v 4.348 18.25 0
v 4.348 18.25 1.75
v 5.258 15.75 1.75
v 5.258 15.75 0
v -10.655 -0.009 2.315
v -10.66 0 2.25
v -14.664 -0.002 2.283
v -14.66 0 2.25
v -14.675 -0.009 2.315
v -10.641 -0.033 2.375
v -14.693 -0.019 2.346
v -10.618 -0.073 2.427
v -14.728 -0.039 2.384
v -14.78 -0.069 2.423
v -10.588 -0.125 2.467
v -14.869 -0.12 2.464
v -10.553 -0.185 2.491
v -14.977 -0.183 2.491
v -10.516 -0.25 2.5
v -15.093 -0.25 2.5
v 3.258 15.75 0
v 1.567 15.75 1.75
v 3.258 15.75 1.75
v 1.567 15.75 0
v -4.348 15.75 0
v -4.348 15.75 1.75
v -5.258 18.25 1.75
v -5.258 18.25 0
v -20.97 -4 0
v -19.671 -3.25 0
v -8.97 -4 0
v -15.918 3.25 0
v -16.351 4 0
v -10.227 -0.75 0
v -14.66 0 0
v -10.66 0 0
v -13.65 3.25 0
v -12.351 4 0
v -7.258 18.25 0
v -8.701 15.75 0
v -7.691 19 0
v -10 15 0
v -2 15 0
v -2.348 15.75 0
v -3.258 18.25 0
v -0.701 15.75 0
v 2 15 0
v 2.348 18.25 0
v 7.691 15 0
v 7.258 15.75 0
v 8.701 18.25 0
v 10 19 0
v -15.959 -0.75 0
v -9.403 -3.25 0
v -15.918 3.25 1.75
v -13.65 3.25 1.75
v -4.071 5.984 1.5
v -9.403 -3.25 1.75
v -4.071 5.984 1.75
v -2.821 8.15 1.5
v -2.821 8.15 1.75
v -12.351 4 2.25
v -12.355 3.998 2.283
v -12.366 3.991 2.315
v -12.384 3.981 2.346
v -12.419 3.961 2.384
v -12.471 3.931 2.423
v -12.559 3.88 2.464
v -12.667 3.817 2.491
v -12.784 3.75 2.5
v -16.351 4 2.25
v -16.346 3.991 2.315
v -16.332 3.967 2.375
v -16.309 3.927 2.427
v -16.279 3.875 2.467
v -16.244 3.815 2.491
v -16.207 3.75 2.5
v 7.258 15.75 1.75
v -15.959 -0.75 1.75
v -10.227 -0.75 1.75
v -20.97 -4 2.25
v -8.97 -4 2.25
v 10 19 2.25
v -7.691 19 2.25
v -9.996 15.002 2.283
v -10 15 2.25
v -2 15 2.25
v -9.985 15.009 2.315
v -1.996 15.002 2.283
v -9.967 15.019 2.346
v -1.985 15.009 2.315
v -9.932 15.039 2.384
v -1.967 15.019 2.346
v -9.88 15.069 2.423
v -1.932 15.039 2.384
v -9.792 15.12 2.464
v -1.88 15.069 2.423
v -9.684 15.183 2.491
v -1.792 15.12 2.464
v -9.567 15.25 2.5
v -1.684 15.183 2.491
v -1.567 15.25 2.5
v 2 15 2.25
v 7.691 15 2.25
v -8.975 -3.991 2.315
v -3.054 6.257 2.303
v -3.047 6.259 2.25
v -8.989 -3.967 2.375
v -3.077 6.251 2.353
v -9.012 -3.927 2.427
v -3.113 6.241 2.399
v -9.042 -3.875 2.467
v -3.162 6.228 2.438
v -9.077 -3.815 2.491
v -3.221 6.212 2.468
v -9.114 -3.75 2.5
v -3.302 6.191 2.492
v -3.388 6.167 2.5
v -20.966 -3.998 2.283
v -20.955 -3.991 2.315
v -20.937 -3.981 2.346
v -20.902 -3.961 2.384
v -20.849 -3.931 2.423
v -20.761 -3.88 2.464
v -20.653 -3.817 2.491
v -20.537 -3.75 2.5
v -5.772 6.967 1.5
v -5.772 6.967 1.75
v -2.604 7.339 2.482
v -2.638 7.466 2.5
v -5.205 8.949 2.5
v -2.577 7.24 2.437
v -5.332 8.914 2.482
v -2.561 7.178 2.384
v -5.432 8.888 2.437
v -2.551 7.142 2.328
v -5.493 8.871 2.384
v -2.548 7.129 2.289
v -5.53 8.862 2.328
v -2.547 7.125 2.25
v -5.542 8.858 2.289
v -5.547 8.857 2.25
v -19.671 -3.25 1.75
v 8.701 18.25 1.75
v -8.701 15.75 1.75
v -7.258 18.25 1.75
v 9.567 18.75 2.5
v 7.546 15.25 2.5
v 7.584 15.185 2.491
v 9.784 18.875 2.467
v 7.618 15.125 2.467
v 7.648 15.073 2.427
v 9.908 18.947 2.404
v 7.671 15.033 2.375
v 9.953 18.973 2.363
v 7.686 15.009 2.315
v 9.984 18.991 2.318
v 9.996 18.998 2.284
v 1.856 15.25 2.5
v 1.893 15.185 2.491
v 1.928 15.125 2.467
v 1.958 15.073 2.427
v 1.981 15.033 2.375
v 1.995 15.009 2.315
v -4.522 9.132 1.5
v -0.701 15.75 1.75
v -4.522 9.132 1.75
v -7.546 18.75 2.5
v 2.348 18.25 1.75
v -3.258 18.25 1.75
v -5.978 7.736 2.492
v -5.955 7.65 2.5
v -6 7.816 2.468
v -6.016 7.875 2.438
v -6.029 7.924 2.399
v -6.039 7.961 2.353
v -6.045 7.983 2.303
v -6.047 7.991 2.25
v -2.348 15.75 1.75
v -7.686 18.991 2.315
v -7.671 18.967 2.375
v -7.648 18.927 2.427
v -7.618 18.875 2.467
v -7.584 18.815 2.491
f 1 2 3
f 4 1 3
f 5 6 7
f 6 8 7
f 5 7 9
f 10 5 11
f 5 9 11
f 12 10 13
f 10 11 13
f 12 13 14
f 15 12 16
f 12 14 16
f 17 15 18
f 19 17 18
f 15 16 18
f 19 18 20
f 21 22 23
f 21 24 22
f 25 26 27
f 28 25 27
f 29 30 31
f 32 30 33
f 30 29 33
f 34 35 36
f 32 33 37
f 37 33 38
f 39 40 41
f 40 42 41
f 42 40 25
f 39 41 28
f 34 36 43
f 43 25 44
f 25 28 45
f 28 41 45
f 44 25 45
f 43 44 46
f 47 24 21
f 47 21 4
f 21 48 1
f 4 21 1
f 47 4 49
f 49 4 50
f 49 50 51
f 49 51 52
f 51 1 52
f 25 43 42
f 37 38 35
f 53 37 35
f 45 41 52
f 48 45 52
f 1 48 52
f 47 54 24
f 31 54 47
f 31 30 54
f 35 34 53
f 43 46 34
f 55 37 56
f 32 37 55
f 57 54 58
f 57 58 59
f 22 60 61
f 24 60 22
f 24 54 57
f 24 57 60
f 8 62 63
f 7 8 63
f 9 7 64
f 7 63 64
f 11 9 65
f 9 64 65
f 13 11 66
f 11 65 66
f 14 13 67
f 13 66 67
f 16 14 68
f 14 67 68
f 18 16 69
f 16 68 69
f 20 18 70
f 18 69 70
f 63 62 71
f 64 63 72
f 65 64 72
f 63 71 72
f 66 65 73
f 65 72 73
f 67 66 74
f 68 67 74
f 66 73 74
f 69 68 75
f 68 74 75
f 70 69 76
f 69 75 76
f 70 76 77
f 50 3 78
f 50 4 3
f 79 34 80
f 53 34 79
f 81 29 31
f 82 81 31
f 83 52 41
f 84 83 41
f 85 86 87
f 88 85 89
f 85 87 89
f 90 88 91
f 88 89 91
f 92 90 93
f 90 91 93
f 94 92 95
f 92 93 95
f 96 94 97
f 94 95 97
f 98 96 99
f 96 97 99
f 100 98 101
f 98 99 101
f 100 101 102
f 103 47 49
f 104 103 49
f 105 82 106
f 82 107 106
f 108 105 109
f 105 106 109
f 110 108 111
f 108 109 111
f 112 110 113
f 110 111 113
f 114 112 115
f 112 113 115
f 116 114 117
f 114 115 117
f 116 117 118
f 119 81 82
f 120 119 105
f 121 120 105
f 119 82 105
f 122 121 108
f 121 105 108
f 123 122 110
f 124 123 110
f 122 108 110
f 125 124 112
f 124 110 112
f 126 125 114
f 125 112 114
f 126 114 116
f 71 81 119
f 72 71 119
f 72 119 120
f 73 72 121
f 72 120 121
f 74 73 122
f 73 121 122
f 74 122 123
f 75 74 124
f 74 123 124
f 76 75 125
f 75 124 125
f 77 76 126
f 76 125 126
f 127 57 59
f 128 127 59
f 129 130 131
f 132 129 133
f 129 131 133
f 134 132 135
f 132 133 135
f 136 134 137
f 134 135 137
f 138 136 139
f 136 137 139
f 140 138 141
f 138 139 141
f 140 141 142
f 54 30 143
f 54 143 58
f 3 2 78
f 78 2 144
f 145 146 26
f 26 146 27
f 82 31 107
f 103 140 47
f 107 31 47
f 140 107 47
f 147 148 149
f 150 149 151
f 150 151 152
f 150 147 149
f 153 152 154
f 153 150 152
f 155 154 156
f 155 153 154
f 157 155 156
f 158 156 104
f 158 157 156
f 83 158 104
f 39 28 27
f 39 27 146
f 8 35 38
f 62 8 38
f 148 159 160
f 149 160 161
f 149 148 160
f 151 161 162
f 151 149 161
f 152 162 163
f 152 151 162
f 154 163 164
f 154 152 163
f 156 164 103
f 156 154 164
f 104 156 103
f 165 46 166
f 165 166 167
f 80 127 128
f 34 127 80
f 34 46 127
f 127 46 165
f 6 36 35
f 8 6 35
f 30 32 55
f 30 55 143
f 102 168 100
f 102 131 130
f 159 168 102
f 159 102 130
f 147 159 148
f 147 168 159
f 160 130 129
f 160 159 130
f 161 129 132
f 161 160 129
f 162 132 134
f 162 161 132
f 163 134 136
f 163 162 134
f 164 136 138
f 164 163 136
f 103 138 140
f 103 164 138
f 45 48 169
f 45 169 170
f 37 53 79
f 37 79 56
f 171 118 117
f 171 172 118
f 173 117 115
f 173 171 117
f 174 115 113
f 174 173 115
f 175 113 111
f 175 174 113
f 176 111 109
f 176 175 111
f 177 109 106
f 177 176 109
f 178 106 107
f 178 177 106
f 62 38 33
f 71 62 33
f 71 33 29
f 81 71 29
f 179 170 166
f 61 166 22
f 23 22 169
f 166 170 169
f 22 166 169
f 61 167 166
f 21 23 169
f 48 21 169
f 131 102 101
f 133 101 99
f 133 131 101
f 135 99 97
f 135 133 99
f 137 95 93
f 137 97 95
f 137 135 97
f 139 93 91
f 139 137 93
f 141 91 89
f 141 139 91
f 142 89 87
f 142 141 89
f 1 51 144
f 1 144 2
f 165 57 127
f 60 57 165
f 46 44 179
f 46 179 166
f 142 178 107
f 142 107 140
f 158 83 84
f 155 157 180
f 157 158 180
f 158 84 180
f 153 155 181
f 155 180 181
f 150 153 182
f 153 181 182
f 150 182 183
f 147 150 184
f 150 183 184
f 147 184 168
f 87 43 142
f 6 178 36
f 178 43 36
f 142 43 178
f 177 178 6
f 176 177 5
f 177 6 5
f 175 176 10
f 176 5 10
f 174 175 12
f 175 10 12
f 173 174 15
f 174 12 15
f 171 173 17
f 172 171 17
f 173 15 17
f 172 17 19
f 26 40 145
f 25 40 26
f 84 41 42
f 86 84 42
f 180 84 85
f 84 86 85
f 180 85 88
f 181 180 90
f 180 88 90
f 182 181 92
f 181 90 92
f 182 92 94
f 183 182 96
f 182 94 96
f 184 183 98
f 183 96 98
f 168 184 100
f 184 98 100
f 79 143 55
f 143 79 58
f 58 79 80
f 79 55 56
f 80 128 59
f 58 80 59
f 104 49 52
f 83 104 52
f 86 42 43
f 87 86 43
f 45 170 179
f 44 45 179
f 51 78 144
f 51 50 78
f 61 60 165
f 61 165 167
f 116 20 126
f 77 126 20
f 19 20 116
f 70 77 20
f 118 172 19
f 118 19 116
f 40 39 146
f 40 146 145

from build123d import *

# Parameters (mm, degrees)
F1_DEPTH = 2.5
F4_W     = 1
F4_H     = 5.3799478337
F5_DEPTH = 100
F6_T     = -0.75
F7_R     = 0.24999
F9_DEPTH = 1.75


# Not quite as in the source:
# - a fillet or chamfer is up to 0.001 mm smaller than in the source, because OpenCascade refuses the exact size


with BuildPart() as f1:
    # F0 (on Top) → F1 (new body)
    with BuildSketch(Plane.XY):
        Polygon((-7.6905989232, 19), (-10, 15), (-2, 15), (-10.6602540378, 0), (-14.6602540378, 0), (-12.3508529611, 4), (-16.3508529611, 4), (-20.9696551146, -4), (-8.9696551146, -4), (2, 15), (7.6905989232, 15), (10, 19), align=None)
    extrude(amount=F1_DEPTH)

    # F4 (on offset) → F5 (cut)
    with BuildSketch(Plane(origin=(16.6554445662, -9.6160254038, 0), x_dir=(0.5, 0.8660254038, 0), z_dir=(0.8660254038, -0.5, 0))):
        with Locations((4.397114317, 4.9399739169)):
            Rectangle(F4_W, F4_H)
    extrude(amount=-F5_DEPTH, mode=Mode.SUBTRACT)

    # F6
    f6_openings = [f1.faces().sort_by_distance(p)[0] for p in [
        (-8.51122, 16.807119, 0),
    ]]
    offset(amount=F6_T, openings=f6_openings, kind=Kind.INTERSECTION)

    # F7 (radius 0.25 in the source; OpenCascade refuses exactly that, so slightly less here)
    f7_edges = [f1.edges().sort_by_distance(p)[0] for p in [
        (-0.273317, 11.0625, 2.5),
        (4.845299, 15, 2.5),
        (8.845299, 17, 2.5),
        (1.154701, 19, 2.5),
        (-8.845299, 17, 2.5),
        (-6, 15, 2.5),
        (-3.773317, 11.928525, 2.5),
        (-4.046633, 7.991025, 2.5),
        (-8.353444, 3.995513, 2.5),
        (-12.660254, 0, 2.5),
        (-13.505553, 2, 2.5),
        (-14.350853, 4, 2.5),
        (-18.660254, 0, 2.5),
        (-14.969655, -4, 2.5),
        (-6.008144, 1.129487, 2.5),
        (-4.546633, 7.125, 2.5),
    ]]
    fillet(f7_edges, radius=F7_R)

    # F8 (on face) → F9 (join, through all)
    with BuildSketch(Plane(origin=(0, 0, 1.75), x_dir=(1, 0, 0), z_dir=(0, 0, -1))):
        Polygon((-4.3476606357, -15.75), (-5.2575862213, -18.25), (-3.2575862213, -18.25), (-2.3476606357, -15.75), align=None)
        Polygon((3.2575862213, -15.75), (2.3476606357, -18.25), (4.3476606357, -18.25), (5.2575862213, -15.75), align=None)
    extrude(amount=F9_DEPTH)


solid = f1.part
